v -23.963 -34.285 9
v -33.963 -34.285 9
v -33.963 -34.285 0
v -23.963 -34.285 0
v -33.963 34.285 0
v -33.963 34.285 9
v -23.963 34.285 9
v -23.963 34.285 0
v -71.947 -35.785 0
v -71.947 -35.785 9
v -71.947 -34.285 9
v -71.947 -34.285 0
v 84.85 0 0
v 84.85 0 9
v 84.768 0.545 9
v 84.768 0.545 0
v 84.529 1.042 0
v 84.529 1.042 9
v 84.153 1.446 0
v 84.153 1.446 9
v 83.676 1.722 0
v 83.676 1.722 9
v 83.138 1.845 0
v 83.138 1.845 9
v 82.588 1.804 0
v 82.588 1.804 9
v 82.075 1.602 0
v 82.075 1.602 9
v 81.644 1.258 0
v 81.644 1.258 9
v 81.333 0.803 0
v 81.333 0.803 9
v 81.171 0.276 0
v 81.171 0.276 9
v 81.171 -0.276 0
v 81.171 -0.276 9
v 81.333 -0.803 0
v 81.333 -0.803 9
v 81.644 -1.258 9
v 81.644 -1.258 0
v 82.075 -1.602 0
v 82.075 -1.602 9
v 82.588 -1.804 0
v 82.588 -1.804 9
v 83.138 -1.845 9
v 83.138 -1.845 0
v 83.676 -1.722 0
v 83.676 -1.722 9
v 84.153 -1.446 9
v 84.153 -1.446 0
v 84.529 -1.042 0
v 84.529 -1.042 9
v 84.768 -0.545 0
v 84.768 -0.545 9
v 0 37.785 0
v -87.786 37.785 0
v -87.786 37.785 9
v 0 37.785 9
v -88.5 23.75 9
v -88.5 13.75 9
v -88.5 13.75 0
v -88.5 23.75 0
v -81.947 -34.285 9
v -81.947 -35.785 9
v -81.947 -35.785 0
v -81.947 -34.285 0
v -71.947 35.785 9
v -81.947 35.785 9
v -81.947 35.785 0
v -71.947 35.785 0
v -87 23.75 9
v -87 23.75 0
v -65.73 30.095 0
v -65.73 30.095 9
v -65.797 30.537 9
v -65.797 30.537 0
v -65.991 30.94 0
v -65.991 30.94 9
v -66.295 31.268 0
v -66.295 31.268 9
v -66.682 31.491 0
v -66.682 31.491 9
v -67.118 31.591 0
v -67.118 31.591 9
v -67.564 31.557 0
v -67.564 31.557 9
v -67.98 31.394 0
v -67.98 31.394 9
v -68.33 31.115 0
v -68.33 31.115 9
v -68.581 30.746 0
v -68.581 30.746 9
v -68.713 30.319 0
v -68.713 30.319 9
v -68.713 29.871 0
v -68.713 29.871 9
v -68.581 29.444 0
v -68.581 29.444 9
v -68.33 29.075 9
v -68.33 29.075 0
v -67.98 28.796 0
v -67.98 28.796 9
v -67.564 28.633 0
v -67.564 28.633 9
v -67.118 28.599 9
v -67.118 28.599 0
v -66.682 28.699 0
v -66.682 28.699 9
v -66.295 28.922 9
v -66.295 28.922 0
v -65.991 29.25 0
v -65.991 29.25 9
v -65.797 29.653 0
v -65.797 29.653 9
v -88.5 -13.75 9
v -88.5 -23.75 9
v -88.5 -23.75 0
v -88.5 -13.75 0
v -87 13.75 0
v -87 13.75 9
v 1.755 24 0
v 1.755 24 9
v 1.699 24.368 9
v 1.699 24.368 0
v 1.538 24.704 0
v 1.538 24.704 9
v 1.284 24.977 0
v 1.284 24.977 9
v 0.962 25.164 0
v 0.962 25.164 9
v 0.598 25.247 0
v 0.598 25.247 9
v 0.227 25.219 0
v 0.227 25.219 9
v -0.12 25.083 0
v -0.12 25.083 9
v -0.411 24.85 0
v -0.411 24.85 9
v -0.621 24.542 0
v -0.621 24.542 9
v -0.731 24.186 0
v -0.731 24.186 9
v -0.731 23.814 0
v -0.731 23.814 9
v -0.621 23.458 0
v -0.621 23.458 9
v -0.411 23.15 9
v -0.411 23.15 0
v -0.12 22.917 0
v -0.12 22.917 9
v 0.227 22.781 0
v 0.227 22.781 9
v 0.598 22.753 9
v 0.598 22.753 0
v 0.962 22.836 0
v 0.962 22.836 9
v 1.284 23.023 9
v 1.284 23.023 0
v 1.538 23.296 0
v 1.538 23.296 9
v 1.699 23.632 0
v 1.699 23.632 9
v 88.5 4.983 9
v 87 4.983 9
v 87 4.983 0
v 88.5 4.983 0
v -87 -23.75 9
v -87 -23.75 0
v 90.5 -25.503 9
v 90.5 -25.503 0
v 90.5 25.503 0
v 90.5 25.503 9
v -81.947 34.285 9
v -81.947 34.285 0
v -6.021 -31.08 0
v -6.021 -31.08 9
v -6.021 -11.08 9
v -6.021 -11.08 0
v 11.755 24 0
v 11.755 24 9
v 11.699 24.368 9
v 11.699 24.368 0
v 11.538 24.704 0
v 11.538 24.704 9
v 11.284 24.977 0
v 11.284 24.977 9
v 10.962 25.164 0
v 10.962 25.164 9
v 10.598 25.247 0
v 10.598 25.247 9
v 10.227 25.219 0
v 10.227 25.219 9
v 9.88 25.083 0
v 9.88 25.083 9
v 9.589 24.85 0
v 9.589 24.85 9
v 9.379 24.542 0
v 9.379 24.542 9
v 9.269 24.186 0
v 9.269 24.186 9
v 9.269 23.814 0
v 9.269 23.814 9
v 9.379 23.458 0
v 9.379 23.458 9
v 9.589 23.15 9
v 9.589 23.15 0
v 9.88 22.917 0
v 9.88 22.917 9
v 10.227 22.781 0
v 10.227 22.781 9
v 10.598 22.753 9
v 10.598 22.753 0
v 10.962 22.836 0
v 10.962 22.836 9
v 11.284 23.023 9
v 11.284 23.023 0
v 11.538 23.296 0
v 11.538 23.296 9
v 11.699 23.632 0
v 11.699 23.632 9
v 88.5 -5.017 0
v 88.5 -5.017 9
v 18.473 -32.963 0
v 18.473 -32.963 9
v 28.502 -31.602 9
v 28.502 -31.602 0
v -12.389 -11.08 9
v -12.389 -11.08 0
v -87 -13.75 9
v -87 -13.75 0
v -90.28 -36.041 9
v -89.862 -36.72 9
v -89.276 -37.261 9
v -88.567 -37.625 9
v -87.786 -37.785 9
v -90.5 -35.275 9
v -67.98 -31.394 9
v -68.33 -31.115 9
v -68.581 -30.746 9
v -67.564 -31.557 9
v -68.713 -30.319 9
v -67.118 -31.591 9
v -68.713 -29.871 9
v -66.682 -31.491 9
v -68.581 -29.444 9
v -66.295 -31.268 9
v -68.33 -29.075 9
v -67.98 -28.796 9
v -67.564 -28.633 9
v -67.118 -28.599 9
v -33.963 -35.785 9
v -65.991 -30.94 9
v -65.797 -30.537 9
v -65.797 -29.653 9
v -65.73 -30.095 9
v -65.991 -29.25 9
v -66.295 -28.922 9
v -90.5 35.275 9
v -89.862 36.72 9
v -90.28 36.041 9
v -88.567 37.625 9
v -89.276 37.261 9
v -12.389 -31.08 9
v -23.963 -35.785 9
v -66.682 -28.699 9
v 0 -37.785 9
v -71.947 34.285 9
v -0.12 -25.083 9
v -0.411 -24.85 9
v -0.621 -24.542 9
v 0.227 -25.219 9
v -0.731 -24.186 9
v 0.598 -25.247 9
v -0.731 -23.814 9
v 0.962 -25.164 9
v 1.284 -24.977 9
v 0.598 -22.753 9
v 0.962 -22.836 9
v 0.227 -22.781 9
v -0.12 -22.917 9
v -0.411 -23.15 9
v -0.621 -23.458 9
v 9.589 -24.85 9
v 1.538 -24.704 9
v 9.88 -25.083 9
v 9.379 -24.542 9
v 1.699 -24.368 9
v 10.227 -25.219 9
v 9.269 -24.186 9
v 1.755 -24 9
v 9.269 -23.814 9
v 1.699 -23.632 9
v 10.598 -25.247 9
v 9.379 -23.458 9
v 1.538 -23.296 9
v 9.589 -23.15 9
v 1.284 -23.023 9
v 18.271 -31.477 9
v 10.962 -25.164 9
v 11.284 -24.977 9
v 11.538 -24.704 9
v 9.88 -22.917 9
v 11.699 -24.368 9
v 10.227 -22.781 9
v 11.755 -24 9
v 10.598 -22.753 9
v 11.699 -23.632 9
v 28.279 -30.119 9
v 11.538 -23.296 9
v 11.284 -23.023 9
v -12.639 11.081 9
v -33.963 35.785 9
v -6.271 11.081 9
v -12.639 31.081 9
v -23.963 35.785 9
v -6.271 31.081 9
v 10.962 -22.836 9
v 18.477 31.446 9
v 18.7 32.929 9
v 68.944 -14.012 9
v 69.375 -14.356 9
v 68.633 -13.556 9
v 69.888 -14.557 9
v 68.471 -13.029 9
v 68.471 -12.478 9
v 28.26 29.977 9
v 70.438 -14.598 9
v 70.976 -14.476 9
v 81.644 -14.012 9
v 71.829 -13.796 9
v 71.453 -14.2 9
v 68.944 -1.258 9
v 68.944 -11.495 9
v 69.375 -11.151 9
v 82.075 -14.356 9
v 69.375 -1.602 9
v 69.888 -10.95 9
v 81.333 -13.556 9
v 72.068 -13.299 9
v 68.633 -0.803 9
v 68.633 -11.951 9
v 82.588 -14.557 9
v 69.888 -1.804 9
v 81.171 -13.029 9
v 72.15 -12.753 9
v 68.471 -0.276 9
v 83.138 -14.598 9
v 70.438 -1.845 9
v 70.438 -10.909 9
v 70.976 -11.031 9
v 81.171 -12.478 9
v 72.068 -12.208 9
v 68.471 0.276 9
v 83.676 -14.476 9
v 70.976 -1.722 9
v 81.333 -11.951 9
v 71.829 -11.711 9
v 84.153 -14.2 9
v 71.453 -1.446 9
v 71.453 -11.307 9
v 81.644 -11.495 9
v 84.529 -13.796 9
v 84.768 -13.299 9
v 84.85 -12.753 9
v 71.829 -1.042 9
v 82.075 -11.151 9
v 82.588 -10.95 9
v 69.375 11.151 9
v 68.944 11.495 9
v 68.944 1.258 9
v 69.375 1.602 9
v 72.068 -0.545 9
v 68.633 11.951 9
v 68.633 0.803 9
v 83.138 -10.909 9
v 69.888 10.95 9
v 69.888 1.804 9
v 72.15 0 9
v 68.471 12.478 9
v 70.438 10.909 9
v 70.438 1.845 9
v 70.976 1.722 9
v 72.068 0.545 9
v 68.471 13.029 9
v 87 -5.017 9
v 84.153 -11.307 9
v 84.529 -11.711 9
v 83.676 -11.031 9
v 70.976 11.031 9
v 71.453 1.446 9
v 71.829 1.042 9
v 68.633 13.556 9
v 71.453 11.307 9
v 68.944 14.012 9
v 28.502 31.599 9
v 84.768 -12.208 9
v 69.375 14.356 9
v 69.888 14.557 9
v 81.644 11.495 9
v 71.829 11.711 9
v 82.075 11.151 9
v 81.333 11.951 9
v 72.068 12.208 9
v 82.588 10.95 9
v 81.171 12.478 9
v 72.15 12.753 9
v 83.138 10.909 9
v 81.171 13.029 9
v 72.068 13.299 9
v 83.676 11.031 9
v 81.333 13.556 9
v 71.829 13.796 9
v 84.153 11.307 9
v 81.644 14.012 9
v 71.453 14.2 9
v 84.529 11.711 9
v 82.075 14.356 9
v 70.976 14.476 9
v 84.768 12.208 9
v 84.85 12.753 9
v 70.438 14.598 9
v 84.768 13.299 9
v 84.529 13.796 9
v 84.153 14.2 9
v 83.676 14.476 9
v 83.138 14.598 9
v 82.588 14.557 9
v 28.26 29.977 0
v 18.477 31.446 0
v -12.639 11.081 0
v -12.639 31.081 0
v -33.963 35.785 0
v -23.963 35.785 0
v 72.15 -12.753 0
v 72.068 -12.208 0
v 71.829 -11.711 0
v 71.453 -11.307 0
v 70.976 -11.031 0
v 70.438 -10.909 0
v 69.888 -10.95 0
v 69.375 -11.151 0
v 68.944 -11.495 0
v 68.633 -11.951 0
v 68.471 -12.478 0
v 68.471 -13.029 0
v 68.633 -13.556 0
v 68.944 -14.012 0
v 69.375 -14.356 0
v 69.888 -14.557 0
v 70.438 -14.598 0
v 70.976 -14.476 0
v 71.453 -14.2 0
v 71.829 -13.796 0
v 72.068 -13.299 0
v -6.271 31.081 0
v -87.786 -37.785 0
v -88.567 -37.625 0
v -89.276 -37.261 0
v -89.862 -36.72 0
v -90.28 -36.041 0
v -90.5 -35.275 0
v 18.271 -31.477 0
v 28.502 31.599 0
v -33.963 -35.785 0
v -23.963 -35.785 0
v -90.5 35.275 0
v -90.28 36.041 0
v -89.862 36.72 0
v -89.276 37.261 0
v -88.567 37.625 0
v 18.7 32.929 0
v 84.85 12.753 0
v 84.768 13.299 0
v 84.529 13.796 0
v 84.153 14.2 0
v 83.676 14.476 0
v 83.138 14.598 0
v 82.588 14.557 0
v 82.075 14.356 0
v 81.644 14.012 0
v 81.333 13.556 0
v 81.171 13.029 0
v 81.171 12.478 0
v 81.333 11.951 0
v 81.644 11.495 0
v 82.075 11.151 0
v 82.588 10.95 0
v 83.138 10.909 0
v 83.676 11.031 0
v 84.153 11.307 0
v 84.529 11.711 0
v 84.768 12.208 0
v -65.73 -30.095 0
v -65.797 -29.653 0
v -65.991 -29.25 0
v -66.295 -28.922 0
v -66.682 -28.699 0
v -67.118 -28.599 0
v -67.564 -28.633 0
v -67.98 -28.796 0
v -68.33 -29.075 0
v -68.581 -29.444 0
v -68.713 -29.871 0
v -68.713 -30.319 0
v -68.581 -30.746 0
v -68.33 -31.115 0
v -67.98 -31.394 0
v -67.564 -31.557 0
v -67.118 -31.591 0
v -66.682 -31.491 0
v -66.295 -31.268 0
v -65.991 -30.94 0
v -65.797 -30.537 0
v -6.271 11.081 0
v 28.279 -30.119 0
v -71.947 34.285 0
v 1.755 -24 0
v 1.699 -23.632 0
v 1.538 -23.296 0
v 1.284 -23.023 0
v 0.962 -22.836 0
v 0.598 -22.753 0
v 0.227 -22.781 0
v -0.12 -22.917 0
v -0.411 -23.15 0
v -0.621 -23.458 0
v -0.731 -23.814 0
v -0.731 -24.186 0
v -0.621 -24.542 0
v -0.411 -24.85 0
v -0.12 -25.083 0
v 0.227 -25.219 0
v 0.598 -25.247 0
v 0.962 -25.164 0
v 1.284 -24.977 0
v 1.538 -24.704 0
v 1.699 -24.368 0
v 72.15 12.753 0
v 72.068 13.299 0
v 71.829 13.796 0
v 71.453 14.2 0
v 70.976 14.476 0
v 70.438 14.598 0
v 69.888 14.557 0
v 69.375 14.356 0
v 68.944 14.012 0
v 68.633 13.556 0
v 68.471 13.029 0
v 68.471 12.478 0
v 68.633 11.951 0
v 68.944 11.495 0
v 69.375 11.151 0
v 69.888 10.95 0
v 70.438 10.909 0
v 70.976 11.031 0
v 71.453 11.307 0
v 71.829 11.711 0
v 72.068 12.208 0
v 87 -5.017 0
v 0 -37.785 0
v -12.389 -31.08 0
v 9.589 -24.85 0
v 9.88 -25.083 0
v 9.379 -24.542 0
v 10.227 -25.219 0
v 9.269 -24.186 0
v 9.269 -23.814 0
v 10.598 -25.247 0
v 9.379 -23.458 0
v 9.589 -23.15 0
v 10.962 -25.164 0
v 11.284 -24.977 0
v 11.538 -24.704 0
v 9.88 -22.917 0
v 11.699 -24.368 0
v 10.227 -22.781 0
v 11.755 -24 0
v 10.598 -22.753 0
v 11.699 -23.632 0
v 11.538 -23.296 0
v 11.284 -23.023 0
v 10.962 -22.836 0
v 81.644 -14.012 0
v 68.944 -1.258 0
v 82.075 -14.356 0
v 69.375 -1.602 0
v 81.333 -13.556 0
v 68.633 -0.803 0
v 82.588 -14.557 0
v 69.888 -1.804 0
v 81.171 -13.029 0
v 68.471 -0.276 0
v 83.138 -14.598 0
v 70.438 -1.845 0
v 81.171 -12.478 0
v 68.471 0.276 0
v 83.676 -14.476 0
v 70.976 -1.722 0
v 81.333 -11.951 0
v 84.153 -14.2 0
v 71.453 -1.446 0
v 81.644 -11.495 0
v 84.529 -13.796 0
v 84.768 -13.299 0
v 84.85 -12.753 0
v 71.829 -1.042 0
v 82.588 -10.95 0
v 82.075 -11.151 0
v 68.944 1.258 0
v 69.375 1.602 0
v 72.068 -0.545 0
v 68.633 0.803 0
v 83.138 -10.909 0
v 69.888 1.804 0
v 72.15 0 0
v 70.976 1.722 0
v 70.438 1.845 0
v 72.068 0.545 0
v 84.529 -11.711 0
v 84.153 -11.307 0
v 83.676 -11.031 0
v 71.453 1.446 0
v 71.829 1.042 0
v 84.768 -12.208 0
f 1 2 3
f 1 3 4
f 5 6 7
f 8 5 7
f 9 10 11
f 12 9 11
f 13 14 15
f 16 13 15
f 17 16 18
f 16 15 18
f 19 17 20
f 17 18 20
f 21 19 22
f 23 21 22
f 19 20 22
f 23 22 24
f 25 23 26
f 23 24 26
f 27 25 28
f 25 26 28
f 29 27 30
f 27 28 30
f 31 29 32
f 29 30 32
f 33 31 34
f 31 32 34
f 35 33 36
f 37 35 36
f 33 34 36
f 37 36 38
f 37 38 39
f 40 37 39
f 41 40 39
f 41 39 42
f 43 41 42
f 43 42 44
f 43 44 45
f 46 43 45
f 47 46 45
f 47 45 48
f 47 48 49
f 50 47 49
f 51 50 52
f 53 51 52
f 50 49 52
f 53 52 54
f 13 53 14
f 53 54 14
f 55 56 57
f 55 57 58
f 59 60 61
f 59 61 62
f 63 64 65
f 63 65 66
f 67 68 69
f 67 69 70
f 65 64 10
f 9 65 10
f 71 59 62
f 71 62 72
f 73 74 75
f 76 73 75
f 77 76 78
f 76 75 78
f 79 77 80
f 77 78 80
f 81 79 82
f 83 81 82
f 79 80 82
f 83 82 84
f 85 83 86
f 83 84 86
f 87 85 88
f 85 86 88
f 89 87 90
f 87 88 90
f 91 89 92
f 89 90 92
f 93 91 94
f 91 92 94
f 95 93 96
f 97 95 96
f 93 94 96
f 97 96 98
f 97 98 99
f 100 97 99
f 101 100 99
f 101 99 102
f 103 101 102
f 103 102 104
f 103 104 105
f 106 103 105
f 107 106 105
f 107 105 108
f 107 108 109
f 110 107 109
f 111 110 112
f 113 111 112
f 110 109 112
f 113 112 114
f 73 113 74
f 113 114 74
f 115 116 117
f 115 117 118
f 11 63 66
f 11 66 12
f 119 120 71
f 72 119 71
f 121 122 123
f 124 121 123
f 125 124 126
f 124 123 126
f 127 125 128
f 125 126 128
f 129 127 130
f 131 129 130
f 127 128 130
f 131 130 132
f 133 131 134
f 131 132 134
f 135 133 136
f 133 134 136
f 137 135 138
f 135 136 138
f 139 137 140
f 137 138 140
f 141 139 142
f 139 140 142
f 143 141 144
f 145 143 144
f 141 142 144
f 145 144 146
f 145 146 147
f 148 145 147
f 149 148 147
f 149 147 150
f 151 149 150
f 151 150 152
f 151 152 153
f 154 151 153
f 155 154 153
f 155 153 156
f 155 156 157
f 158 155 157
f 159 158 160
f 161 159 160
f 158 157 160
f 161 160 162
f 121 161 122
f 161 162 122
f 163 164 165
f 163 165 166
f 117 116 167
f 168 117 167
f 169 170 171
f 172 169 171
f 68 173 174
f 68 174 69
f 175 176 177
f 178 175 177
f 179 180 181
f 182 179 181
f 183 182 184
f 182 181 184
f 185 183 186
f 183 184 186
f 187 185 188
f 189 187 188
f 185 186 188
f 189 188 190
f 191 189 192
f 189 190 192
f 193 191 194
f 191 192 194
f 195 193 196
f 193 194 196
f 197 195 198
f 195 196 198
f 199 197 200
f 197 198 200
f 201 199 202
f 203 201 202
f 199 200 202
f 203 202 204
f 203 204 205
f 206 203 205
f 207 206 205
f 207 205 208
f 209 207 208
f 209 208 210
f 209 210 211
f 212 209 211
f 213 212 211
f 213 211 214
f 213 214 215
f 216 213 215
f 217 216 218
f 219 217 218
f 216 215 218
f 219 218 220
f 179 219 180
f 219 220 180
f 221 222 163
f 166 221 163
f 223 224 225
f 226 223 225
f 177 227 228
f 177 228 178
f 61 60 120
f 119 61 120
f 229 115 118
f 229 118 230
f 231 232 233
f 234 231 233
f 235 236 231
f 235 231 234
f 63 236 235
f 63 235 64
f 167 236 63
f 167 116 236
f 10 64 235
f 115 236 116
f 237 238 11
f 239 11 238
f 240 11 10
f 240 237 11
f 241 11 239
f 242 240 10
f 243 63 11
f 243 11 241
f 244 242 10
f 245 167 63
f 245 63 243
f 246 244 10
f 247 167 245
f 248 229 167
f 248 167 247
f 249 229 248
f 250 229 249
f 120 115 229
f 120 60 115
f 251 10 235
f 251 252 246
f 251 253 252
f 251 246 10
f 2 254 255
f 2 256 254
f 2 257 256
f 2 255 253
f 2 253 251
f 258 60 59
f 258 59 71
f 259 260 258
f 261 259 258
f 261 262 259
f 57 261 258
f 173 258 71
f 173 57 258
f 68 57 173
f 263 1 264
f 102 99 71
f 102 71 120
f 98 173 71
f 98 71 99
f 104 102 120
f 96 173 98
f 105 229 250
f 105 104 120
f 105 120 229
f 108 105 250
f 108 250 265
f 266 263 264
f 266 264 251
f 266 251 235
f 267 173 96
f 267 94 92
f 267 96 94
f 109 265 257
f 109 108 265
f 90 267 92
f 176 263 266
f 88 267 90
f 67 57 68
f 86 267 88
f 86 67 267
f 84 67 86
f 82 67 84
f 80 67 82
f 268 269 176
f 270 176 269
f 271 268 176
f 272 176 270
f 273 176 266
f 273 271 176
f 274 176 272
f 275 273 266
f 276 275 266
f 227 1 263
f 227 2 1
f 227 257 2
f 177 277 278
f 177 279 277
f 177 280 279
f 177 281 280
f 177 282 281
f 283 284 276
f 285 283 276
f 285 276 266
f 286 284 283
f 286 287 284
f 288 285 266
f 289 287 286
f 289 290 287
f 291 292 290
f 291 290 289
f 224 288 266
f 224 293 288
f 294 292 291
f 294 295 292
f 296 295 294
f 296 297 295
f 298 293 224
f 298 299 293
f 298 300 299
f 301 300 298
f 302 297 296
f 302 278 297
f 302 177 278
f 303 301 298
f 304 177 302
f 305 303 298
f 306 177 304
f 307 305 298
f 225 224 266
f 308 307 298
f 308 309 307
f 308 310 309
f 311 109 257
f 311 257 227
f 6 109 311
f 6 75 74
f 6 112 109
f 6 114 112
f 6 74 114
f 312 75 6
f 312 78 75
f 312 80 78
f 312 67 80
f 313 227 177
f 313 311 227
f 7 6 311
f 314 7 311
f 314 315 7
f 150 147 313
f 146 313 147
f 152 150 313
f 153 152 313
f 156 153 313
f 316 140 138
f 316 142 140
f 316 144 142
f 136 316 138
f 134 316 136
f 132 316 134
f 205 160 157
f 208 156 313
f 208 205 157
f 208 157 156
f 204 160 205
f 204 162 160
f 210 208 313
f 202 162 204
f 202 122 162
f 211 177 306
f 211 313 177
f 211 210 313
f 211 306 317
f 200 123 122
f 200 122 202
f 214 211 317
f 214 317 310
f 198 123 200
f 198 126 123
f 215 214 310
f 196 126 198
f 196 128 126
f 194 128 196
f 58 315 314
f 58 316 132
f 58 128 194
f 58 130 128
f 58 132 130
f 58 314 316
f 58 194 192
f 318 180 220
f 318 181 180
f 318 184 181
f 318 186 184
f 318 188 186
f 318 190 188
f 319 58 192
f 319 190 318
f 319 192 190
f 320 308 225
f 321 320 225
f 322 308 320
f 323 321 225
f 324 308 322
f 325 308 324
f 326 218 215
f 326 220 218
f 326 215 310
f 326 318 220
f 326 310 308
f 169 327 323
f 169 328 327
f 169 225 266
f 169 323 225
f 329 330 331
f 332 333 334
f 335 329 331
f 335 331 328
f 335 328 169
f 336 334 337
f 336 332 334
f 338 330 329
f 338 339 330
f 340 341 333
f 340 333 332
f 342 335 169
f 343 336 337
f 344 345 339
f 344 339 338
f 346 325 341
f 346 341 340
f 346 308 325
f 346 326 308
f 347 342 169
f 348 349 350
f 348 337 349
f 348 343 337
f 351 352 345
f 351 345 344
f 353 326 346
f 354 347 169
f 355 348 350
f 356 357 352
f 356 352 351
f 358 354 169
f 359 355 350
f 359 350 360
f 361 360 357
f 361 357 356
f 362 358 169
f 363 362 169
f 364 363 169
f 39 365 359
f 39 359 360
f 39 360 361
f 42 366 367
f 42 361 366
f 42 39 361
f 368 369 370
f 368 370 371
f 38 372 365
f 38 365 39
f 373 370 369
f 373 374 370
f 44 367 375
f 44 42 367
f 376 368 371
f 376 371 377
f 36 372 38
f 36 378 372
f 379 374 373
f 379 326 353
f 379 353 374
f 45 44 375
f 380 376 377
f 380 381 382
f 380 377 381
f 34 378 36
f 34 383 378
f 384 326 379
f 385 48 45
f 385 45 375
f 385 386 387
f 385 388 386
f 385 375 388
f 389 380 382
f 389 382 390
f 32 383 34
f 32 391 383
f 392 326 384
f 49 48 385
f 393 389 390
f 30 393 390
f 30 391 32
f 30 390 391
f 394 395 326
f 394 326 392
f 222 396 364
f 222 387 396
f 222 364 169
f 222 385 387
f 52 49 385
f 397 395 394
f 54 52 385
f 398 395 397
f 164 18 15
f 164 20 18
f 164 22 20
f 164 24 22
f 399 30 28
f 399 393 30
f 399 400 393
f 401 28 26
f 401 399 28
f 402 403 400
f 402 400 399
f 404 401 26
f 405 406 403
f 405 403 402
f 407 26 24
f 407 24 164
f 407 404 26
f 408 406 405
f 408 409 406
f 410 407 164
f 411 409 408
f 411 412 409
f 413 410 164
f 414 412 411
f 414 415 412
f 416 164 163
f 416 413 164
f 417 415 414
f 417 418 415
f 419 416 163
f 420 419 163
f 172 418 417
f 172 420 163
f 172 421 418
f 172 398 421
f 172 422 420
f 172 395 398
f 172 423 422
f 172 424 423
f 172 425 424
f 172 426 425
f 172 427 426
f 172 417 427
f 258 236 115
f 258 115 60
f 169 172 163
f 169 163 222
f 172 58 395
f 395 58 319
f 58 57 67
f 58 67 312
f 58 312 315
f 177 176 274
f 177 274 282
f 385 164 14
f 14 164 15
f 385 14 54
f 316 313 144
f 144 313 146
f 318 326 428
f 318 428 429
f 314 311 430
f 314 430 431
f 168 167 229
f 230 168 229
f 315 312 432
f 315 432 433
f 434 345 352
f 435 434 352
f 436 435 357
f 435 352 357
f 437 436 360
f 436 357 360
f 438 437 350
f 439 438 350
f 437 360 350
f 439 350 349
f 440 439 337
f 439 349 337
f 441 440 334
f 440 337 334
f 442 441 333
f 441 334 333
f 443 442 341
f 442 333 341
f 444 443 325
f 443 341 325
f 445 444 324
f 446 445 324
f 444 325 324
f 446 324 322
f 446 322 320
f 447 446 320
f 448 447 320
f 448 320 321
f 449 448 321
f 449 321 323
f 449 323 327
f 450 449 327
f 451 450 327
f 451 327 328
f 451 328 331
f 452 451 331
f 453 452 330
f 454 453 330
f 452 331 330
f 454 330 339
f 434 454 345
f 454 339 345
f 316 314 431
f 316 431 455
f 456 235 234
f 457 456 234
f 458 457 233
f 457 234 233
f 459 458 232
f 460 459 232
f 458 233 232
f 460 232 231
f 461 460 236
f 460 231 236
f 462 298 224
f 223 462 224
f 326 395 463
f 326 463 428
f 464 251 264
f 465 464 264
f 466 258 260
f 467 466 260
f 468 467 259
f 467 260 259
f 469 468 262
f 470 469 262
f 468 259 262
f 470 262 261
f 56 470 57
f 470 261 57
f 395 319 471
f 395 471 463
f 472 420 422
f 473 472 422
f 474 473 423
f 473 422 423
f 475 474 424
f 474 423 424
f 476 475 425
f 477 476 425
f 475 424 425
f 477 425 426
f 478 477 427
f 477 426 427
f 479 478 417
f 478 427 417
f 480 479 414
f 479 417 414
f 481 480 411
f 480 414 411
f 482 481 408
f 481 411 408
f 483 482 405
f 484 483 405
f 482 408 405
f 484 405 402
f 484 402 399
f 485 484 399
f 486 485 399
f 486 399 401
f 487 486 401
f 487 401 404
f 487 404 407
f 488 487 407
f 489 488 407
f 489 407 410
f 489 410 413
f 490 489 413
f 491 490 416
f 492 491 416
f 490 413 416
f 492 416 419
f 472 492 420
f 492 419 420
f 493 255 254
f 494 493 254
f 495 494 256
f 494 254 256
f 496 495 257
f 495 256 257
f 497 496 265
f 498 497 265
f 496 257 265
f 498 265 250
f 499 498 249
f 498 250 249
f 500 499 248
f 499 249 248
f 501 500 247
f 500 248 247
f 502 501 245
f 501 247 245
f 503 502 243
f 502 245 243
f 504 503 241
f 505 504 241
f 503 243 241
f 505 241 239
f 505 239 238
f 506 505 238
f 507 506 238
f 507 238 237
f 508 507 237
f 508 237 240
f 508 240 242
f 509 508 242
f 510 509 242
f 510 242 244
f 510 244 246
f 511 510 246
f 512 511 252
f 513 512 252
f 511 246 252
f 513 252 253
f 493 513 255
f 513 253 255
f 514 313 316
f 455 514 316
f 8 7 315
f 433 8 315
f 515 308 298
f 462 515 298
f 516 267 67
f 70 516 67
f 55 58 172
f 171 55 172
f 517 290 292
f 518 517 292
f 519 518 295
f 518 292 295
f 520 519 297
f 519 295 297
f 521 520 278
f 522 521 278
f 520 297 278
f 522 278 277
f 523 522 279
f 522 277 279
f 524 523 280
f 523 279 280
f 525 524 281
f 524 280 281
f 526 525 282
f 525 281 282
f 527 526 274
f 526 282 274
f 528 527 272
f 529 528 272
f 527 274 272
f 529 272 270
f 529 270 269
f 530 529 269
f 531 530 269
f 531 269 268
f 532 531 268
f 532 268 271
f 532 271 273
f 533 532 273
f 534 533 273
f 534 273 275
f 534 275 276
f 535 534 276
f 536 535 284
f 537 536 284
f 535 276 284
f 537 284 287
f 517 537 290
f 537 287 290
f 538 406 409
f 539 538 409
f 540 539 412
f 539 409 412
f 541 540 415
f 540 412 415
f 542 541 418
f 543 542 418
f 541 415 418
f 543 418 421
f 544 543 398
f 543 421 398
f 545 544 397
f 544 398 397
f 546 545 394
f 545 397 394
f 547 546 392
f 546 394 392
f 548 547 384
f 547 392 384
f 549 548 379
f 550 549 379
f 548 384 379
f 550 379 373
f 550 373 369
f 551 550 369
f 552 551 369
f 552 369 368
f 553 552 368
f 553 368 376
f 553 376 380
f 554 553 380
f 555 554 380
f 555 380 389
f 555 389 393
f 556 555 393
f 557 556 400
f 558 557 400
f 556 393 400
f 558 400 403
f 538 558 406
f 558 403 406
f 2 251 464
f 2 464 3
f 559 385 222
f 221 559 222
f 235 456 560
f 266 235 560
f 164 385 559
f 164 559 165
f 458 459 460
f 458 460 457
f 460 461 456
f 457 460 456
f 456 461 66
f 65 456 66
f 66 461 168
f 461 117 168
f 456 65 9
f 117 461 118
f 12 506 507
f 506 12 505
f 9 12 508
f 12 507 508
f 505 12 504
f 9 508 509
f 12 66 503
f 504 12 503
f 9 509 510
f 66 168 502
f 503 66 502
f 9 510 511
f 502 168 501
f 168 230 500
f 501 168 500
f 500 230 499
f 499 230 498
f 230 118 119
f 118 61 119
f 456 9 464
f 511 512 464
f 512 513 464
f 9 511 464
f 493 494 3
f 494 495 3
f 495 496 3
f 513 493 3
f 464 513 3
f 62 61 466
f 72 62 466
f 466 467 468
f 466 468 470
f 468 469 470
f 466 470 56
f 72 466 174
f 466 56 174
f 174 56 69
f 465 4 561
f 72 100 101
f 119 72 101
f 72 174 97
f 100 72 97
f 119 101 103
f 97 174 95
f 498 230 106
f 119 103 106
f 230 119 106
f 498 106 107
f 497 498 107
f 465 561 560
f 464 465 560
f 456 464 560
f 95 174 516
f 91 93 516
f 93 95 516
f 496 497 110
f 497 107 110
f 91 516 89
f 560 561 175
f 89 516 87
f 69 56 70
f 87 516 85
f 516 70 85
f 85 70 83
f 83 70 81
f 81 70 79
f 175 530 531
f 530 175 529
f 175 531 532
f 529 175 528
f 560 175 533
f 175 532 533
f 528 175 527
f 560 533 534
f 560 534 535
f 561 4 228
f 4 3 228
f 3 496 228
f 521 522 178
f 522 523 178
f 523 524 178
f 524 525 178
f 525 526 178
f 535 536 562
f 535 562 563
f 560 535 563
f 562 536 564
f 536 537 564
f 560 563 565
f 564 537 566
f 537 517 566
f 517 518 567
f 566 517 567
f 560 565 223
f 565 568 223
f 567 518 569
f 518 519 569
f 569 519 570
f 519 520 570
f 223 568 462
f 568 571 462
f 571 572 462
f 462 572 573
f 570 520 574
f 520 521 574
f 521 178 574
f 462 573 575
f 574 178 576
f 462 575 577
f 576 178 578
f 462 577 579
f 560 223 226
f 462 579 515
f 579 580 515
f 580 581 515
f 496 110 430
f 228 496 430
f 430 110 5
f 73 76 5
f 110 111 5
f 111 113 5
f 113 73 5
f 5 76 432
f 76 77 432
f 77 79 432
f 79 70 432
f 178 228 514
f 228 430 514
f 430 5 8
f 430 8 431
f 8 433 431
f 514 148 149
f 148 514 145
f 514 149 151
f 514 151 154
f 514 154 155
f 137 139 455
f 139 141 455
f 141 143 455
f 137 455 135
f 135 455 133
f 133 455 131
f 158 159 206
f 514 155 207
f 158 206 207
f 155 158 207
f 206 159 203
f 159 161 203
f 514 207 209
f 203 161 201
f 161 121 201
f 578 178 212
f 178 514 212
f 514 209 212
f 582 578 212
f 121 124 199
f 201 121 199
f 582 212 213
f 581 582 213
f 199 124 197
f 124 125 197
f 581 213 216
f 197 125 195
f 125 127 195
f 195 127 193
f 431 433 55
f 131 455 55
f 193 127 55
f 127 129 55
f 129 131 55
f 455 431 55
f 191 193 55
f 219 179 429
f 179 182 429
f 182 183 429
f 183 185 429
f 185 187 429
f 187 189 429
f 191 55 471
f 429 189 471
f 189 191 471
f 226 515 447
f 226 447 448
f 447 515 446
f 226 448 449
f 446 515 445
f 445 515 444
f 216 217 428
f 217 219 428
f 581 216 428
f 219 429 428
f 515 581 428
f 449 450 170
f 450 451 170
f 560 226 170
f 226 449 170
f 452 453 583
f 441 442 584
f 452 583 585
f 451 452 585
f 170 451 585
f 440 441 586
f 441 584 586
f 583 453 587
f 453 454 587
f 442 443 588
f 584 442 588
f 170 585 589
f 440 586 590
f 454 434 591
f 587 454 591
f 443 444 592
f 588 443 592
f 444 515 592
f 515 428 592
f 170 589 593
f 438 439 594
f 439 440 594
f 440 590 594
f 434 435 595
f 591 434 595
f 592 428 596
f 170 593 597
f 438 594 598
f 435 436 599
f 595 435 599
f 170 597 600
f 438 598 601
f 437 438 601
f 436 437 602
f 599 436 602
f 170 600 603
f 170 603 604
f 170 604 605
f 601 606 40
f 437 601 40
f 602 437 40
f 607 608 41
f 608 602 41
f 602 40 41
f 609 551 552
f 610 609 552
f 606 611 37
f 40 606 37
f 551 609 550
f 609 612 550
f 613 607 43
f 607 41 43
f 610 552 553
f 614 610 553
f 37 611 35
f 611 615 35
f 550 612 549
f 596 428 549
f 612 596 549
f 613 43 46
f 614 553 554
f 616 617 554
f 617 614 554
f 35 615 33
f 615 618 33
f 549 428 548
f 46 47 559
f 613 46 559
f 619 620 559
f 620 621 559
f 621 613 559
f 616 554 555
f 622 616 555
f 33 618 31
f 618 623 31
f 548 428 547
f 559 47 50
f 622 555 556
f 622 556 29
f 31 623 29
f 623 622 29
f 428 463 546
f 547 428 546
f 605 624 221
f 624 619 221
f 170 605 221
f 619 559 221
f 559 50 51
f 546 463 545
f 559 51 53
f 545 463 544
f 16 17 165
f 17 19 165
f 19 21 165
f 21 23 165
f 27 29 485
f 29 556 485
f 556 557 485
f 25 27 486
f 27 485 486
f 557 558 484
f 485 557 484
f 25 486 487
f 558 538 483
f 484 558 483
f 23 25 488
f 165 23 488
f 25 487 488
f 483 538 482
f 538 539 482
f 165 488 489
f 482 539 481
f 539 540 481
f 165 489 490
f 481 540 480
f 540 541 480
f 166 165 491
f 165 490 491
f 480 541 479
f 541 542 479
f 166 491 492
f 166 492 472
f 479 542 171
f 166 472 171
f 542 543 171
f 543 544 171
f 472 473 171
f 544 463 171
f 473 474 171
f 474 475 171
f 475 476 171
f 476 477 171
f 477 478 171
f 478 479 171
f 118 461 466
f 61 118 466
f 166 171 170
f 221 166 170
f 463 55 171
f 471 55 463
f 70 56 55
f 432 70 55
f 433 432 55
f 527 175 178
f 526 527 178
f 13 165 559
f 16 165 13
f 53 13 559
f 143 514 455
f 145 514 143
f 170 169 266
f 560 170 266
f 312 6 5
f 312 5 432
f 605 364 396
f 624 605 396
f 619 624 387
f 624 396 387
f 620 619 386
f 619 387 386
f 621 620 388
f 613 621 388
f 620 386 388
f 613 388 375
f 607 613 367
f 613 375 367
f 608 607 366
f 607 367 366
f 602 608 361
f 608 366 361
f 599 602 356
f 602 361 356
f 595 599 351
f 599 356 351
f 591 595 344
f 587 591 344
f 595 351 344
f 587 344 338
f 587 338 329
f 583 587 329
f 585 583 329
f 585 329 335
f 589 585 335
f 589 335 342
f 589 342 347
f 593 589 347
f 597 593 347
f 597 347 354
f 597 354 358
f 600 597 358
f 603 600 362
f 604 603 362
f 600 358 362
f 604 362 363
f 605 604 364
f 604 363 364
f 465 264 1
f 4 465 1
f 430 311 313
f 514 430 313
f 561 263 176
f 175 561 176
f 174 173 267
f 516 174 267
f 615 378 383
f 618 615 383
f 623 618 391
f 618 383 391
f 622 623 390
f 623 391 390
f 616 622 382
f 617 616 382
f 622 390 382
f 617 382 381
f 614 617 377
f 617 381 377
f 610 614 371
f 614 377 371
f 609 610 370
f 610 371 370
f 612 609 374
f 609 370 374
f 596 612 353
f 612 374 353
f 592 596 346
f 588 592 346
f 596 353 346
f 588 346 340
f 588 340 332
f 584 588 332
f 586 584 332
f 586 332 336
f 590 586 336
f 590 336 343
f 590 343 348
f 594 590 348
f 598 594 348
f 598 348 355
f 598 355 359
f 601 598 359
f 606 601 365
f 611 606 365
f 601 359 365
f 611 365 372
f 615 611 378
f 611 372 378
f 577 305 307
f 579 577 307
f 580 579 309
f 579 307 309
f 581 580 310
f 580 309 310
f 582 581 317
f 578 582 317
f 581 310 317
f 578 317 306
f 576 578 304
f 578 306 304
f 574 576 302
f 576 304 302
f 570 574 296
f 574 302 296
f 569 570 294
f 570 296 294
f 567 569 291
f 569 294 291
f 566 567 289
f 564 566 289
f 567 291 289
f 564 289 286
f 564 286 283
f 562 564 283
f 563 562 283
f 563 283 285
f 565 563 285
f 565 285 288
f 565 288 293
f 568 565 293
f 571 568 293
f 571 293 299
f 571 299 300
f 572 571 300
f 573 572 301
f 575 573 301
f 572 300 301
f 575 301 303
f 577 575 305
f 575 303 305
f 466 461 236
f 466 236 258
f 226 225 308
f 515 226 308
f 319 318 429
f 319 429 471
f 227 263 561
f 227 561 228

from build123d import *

# Parameters (mm, degrees)
SKETCH1_W           = 181
SKETCH1_H           = 75.57
BOSS_EXTRUDE2_DEPTH = 9
SKETCH6_W           = 1.5
SKETCH6_H           = 10
SKETCH6_R           = 1.85
SKETCH6_R_2         = 1.25
SKETCH6_W_2         = 6.368125956
SKETCH6_H_2         = 20
SKETCH6_W_3         = 6.368125955
SKETCH6_W_4         = 10
SKETCH6_H_3         = 1.5
SKETCH6_R_3         = 1.5
CUT_EXTRUDE7_DEPTH  = 9


with BuildPart() as part:
    # Sketch1 → Boss-Extrude2 (new body)
    with BuildSketch(Plane.XY):
        Rectangle(SKETCH1_W, SKETCH1_H)
    extrude(amount=BOSS_EXTRUDE2_DEPTH)

    # Sketch6 → Cut-Extrude7 (cut)
    with BuildSketch(Plane.XY.offset(9)):
        Polygon((90.5, -25.503407437), (0, -37.785), (90.5, -37.785), align=None)
        Polygon((90.5, 37.785), (0, 37.785), (90.5, 25.503407437), align=None)
        with Locations((87.75, -0.017122468)):
            Rectangle(SKETCH6_W, SKETCH6_H)
        with Locations((83, 0)):
            Circle(SKETCH6_R)
        with Locations((83, -12.753407437)):
            Circle(SKETCH6_R)
        with Locations((70.3, -12.753407437)):
            Circle(SKETCH6_R)
        with Locations((70.3, 0)):
            Circle(SKETCH6_R)
        with Locations((70.3, 12.753407437)):
            Circle(SKETCH6_R)
        with Locations((83, 12.753407437)):
            Circle(SKETCH6_R)
        Polygon((18.699571513, 32.929403247), (28.501771515, 31.599164279), (28.260126082, 29.976752052), (18.476794857, 31.446038639), align=None)
        with Locations((10.504840582, 24)):
            Circle(SKETCH6_R_2)
        with Locations((0.504840582, 24)):
            Circle(SKETCH6_R_2)
        with Locations((-9.454971277, 21.080969171)):
            Rectangle(SKETCH6_W_2, SKETCH6_H_2)
        with Locations((-9.205288194, -21.08)):
            Rectangle(SKETCH6_W_3, SKETCH6_H_2)
        with Locations((0.504840582, -24)):
            Circle(SKETCH6_R_2)
        with Locations((10.504840582, -24)):
            Circle(SKETCH6_R_2)
        Polygon((18.472571869, -32.963494813), (28.501771515, -31.60245013), (28.279412419, -30.118876563), (18.270858535, -31.477119446), align=None)
        with Locations((-28.962631903, 35.035)):
            Rectangle(SKETCH6_W_4, SKETCH6_H_3)
        with Locations((-76.947155779, 35.035)):
            Rectangle(SKETCH6_W_4, SKETCH6_H_3)
        with Locations((-67.23, 30.095)):
            Circle(SKETCH6_R_3)
        with BuildLine():
            Line((-90.5, 37.785), (-90.5, 35.274795088))
            ThreePointArc((-90.5, 35.274795088), (-89.587457665, 37.010103297), (-87.786468161, 37.785))
            Line((-87.786468161, 37.785), (-90.5, 37.785))
        make_face()
        with Locations((-87.75, 18.75)):
            Rectangle(SKETCH6_W, SKETCH6_H)
        with Locations((-87.75, -18.75)):
            Rectangle(SKETCH6_W, SKETCH6_H)
        with BuildLine():
            ThreePointArc((-87.786468161, -37.785), (-89.587457665, -37.010103297), (-90.5, -35.274795088))
            Line((-90.5, -35.274795088), (-90.5, -37.785))
            Line((-90.5, -37.785), (-87.786468161, -37.785))
        make_face()
        with Locations((-76.947155779, -35.035)):
            Rectangle(SKETCH6_W_4, SKETCH6_H_3)
        with Locations((-67.23, -30.095)):
            Circle(SKETCH6_R_3)
        with Locations((-28.962631903, -35.035)):
            Rectangle(SKETCH6_W_4, SKETCH6_H_3)
    extrude(amount=-CUT_EXTRUDE7_DEPTH, mode=Mode.SUBTRACT)


solid = part.part
